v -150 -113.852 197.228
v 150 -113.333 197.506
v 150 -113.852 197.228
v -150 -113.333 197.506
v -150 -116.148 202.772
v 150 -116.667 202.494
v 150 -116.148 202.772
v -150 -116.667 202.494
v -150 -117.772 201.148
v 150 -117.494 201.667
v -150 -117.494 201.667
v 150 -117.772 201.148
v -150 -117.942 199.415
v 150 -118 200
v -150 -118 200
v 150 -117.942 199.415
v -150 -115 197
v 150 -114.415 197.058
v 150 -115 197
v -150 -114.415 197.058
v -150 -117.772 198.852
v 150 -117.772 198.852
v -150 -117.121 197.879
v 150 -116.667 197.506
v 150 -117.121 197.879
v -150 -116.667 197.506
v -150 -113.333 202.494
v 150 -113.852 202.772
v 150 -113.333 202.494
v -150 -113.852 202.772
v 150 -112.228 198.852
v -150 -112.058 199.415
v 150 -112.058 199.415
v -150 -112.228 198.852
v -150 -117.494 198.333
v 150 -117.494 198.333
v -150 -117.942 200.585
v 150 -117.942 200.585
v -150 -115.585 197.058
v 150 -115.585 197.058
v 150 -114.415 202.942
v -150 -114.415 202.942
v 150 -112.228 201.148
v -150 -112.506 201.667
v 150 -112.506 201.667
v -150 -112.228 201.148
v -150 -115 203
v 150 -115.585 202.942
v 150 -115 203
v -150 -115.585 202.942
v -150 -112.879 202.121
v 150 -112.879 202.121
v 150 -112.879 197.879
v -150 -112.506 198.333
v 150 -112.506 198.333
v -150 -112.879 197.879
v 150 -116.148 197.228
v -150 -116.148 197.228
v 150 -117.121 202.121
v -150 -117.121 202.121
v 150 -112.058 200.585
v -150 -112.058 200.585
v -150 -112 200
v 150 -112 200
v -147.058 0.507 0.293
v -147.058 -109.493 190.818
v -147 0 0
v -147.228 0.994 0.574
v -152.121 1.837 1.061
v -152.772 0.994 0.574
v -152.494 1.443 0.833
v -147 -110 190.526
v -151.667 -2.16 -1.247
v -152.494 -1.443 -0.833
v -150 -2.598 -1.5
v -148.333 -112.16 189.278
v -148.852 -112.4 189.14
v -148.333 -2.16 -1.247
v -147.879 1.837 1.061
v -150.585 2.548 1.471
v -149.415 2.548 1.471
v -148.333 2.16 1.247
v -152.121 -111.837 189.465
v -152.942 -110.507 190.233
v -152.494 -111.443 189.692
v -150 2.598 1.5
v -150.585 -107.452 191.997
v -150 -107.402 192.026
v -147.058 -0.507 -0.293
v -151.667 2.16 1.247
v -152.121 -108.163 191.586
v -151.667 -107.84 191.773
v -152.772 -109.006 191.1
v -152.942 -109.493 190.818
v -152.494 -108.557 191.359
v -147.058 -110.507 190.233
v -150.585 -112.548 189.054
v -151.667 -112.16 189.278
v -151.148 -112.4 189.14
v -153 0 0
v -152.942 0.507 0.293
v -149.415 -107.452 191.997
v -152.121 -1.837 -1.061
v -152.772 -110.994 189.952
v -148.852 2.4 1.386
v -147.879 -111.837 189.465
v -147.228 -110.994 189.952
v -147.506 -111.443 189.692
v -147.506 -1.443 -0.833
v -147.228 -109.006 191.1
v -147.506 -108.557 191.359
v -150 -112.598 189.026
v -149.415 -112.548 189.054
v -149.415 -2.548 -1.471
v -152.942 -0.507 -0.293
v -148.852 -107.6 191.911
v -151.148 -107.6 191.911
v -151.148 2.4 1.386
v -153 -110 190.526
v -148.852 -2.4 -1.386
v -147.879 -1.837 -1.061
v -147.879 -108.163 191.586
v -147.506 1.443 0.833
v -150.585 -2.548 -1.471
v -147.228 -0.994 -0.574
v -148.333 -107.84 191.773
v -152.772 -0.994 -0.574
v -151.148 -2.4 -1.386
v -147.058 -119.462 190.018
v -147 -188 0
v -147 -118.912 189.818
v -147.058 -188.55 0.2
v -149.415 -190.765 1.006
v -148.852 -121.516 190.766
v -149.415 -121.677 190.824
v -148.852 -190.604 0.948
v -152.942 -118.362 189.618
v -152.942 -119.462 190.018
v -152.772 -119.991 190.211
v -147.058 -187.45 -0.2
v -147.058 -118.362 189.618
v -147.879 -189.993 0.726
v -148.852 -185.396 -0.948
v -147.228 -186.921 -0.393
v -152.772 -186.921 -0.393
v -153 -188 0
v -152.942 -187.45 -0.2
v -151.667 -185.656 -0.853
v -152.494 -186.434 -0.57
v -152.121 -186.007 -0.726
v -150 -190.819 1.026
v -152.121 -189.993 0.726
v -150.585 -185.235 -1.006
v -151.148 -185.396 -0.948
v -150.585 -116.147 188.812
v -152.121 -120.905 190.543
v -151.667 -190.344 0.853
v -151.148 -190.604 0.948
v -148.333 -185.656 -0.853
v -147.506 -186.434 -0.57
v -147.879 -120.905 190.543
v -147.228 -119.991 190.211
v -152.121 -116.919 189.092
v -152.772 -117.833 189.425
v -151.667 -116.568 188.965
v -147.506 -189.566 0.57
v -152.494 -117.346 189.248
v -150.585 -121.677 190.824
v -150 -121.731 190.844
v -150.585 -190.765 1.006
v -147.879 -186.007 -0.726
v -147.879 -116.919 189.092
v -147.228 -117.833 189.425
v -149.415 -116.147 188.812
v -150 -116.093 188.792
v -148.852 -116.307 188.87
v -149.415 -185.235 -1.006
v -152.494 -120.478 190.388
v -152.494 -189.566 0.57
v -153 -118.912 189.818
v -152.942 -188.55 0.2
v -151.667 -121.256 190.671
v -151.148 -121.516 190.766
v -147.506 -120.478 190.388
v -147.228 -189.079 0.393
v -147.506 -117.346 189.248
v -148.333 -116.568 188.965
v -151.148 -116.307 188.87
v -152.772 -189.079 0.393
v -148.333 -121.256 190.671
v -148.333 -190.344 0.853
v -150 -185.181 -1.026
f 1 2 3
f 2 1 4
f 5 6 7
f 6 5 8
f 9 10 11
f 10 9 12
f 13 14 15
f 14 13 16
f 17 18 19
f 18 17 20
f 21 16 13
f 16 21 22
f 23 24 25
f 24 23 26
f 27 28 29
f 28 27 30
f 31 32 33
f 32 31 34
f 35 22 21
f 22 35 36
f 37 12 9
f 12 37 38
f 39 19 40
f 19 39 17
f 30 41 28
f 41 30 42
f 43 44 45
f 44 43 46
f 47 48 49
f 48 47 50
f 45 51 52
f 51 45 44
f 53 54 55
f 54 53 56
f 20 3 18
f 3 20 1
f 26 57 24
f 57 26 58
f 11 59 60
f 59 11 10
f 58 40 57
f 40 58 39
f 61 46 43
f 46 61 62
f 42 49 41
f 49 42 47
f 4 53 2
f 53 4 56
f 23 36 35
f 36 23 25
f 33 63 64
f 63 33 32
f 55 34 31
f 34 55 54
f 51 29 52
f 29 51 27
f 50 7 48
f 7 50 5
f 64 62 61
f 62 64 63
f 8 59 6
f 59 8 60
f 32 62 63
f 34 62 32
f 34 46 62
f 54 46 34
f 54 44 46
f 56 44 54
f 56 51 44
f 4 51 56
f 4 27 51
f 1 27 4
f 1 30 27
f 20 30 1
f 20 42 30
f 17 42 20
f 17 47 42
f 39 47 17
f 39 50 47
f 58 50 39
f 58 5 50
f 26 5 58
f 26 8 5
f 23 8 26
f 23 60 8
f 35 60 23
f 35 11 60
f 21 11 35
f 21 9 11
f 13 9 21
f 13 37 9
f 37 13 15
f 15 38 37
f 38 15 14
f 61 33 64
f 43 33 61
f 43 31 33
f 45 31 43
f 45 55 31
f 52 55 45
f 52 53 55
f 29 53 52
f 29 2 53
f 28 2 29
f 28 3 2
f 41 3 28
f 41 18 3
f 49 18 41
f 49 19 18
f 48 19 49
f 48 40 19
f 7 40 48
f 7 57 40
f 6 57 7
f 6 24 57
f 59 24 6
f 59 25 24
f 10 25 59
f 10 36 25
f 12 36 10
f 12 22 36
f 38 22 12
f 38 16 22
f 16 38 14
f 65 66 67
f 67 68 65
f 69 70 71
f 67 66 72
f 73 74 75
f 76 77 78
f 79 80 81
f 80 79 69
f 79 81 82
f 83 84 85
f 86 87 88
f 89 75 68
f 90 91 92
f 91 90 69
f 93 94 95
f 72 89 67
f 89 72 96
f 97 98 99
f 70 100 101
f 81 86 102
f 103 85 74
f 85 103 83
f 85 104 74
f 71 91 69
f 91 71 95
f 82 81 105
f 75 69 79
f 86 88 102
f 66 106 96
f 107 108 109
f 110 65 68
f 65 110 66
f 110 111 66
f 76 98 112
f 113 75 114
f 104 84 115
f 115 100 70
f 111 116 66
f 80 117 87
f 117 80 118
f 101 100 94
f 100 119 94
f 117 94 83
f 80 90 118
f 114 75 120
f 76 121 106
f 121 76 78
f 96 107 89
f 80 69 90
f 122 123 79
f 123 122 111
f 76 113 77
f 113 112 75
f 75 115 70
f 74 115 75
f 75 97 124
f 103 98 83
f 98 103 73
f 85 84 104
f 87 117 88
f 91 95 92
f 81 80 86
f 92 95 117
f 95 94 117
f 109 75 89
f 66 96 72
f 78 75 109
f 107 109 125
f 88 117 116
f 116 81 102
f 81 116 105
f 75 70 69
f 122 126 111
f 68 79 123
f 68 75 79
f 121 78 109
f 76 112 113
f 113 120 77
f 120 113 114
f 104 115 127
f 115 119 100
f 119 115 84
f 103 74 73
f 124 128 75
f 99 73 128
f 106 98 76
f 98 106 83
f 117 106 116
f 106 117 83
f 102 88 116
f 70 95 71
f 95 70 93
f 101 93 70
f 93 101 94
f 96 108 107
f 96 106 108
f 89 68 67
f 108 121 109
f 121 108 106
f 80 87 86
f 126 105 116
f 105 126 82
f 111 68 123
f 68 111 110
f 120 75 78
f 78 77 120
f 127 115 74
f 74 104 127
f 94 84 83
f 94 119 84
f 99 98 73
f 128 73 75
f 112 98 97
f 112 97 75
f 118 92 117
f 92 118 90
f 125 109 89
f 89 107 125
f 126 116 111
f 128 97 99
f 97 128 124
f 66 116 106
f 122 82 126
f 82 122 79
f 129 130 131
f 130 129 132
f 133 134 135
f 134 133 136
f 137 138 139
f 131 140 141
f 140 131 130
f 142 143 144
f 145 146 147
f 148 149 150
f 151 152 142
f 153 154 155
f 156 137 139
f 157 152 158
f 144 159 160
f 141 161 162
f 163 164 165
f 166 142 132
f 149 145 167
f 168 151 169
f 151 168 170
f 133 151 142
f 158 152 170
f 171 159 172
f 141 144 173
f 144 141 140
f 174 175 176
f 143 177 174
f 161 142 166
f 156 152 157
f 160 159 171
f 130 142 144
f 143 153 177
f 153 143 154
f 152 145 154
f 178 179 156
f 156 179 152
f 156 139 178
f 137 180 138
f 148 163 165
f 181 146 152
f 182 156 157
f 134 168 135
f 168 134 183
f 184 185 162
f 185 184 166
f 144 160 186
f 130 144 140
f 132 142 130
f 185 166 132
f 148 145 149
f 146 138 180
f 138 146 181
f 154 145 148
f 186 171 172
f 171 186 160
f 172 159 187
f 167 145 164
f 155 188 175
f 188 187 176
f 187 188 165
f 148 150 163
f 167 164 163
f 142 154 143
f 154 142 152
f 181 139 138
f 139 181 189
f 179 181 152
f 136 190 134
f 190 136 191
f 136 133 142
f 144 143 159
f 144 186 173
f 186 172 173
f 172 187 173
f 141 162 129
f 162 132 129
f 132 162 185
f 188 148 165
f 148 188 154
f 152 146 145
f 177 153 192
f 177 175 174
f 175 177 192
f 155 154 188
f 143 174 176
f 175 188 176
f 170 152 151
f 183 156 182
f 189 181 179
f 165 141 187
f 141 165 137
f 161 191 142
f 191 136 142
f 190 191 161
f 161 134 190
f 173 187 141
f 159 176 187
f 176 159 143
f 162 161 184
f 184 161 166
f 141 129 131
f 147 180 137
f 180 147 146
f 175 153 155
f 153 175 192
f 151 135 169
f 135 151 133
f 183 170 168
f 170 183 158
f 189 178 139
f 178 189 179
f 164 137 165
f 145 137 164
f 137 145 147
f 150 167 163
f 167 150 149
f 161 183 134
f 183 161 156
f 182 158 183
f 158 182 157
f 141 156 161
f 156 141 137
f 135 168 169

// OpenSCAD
/**
 * Martin Egli
 * 2021-10-27
 * laptop holder
 */

module aluPipe(len = 100, dia1 = 6, loc_res = 32) {
    color("Silver")
    translate([0, 0, 0])
    cylinder(d = dia1, h = len, $fn = loc_res);
}

module holderFromPipes() {
    // top
    translate([-150, -115, 200])
    rotate([0, 90, 0])
    aluPipe(len = 300);
    
    // right front
    translate([-150, 0, 0])
    rotate([30, 0, 0])
    aluPipe(len = 220);
    // right back
    translate([-150, -188, 0])
    rotate([-20, 0, 0])
    aluPipe(len = 202);
}

module connector1(dia1 = 6.5, loc_res = 32) {
    difference() {
        hull() {
            // top
            rotate([0, 90, 0])
            minkowski() {
                translate([-4, -4, -4])
                cube([8, 8, 40]);
                sphere(2, $fn = loc_res);
            }

            // right front
            rotate([30-180, 0, 0])
            translate([0, 0, 5])
            minkowski() {
                translate([-4, -4, -5])
                cube([8, 8, 40]);
                sphere(2, $fn = loc_res);
            }

            // right back
            rotate([-20-180, 0, 0])
            translate([0, 0, 5])
            minkowski() {
                translate([-4, -4, -5])
                cube([8, 8, 40]);
                sphere(2, $fn = loc_res);
            }
        }
        
        // holes for pipes
        // top
        rotate([0, 90, 0])
        translate([0, 0, -1])
        cylinder(d = dia1, h = 45, $fn = loc_res);
        
        // right front
        rotate([30-180, 0, 0])
        translate([0, 0, 10])
        cylinder(d = dia1, h = 45, $fn = loc_res);
        
        // right back
        rotate([-20-180, 0, 0])
        translate([0, 0, 10])
        cylinder(d = dia1, h = 45, $fn = loc_res);
    }
    
    /*
    // pointers: they cross exactly at the center: WOOHOO
    // top
    rotate([0, 90, 0])
    translate([0, 0, -10])
    cylinder(d = 0.5, h = 45, $fn = loc_res);
    
    // right front
    rotate([30-180, 0, 0])
    translate([0, 0, -10])
    cylinder(d = 0.5, h = 45, $fn = loc_res);
    
    // right back
    rotate([-20-180, 0, 0])
    translate([0, 0, -10])
    cylinder(d = 0.5, h = 45, $fn = loc_res);
    */
}

module connector2(dia1 = 6.5, loc_res = 32) {
        difference() {
        // right back
        rotate([30-180, 0, 0])
        translate([0, 0, -30])
        minkowski() {
            difference() {
                union() {
                    translate([-4, -4, -5])
                    cube([8, 8, 40]);
                    translate([-4, -4, 25])
                    rotate([-30+90, 0, 0])
                    cube([8, 10, 20]);
                    translate([-4, -14, 35])
                    rotate([-30+90+45, 0, 0])
                    cube([8, 8, 15.2]);
                    translate([-4, -23.9, 34.7])
                    rotate([-30+90+45+45, 0, 0])
                    cube([8, 8, 16]);
                }
                translate([-15, -25, 45])
                rotate([-30, 0, 0])
                cube([30, 50, 30]);
            }
            sphere(2, $fn = loc_res);
        }
    
        // right back
        rotate([30, 0, 0])
        translate([0, 0, -0])
        cylinder(d = dia1, h = 45, $fn = loc_res);
    }
            
/*
    // test plate
    translate([-50, -25, -2])
    cube([100, 100, 2]);
*/
}

module connector3(dia1 = 6.5, loc_res = 32) {
    difference() {
        // right back
        rotate([-20-180, 0, 0])
        translate([0, 0, -30])
        minkowski() {
            difference() {
                translate([-4, -4, -5])
                cube([8, 8, 40]);
                translate([-15, -15, 25])
                rotate([20, 0, 0])
                cube([30, 30, 30]);
            }
            sphere(2, $fn = loc_res);
        }
    
        // right back
        rotate([-20, 0, 0])
        translate([0, 0, -1])
        cylinder(d = dia1, h = 45, $fn = loc_res);
    }
            
    /*  
    // test plate
    translate([-15, -15, -2])
    cube([30, 30, 2]);
    */
}


holderFromPipes();

//translate([-150, -115, 200])
//mirror([0, 0, 0]) connector1(); // 1x
//mirror([1, 0, 0]) connector1(); // 1x
//translate([-150, 0, 0])
//connector2();   // 2x
//translate([-150, -188, 0])9
//connector3();   // 2x
